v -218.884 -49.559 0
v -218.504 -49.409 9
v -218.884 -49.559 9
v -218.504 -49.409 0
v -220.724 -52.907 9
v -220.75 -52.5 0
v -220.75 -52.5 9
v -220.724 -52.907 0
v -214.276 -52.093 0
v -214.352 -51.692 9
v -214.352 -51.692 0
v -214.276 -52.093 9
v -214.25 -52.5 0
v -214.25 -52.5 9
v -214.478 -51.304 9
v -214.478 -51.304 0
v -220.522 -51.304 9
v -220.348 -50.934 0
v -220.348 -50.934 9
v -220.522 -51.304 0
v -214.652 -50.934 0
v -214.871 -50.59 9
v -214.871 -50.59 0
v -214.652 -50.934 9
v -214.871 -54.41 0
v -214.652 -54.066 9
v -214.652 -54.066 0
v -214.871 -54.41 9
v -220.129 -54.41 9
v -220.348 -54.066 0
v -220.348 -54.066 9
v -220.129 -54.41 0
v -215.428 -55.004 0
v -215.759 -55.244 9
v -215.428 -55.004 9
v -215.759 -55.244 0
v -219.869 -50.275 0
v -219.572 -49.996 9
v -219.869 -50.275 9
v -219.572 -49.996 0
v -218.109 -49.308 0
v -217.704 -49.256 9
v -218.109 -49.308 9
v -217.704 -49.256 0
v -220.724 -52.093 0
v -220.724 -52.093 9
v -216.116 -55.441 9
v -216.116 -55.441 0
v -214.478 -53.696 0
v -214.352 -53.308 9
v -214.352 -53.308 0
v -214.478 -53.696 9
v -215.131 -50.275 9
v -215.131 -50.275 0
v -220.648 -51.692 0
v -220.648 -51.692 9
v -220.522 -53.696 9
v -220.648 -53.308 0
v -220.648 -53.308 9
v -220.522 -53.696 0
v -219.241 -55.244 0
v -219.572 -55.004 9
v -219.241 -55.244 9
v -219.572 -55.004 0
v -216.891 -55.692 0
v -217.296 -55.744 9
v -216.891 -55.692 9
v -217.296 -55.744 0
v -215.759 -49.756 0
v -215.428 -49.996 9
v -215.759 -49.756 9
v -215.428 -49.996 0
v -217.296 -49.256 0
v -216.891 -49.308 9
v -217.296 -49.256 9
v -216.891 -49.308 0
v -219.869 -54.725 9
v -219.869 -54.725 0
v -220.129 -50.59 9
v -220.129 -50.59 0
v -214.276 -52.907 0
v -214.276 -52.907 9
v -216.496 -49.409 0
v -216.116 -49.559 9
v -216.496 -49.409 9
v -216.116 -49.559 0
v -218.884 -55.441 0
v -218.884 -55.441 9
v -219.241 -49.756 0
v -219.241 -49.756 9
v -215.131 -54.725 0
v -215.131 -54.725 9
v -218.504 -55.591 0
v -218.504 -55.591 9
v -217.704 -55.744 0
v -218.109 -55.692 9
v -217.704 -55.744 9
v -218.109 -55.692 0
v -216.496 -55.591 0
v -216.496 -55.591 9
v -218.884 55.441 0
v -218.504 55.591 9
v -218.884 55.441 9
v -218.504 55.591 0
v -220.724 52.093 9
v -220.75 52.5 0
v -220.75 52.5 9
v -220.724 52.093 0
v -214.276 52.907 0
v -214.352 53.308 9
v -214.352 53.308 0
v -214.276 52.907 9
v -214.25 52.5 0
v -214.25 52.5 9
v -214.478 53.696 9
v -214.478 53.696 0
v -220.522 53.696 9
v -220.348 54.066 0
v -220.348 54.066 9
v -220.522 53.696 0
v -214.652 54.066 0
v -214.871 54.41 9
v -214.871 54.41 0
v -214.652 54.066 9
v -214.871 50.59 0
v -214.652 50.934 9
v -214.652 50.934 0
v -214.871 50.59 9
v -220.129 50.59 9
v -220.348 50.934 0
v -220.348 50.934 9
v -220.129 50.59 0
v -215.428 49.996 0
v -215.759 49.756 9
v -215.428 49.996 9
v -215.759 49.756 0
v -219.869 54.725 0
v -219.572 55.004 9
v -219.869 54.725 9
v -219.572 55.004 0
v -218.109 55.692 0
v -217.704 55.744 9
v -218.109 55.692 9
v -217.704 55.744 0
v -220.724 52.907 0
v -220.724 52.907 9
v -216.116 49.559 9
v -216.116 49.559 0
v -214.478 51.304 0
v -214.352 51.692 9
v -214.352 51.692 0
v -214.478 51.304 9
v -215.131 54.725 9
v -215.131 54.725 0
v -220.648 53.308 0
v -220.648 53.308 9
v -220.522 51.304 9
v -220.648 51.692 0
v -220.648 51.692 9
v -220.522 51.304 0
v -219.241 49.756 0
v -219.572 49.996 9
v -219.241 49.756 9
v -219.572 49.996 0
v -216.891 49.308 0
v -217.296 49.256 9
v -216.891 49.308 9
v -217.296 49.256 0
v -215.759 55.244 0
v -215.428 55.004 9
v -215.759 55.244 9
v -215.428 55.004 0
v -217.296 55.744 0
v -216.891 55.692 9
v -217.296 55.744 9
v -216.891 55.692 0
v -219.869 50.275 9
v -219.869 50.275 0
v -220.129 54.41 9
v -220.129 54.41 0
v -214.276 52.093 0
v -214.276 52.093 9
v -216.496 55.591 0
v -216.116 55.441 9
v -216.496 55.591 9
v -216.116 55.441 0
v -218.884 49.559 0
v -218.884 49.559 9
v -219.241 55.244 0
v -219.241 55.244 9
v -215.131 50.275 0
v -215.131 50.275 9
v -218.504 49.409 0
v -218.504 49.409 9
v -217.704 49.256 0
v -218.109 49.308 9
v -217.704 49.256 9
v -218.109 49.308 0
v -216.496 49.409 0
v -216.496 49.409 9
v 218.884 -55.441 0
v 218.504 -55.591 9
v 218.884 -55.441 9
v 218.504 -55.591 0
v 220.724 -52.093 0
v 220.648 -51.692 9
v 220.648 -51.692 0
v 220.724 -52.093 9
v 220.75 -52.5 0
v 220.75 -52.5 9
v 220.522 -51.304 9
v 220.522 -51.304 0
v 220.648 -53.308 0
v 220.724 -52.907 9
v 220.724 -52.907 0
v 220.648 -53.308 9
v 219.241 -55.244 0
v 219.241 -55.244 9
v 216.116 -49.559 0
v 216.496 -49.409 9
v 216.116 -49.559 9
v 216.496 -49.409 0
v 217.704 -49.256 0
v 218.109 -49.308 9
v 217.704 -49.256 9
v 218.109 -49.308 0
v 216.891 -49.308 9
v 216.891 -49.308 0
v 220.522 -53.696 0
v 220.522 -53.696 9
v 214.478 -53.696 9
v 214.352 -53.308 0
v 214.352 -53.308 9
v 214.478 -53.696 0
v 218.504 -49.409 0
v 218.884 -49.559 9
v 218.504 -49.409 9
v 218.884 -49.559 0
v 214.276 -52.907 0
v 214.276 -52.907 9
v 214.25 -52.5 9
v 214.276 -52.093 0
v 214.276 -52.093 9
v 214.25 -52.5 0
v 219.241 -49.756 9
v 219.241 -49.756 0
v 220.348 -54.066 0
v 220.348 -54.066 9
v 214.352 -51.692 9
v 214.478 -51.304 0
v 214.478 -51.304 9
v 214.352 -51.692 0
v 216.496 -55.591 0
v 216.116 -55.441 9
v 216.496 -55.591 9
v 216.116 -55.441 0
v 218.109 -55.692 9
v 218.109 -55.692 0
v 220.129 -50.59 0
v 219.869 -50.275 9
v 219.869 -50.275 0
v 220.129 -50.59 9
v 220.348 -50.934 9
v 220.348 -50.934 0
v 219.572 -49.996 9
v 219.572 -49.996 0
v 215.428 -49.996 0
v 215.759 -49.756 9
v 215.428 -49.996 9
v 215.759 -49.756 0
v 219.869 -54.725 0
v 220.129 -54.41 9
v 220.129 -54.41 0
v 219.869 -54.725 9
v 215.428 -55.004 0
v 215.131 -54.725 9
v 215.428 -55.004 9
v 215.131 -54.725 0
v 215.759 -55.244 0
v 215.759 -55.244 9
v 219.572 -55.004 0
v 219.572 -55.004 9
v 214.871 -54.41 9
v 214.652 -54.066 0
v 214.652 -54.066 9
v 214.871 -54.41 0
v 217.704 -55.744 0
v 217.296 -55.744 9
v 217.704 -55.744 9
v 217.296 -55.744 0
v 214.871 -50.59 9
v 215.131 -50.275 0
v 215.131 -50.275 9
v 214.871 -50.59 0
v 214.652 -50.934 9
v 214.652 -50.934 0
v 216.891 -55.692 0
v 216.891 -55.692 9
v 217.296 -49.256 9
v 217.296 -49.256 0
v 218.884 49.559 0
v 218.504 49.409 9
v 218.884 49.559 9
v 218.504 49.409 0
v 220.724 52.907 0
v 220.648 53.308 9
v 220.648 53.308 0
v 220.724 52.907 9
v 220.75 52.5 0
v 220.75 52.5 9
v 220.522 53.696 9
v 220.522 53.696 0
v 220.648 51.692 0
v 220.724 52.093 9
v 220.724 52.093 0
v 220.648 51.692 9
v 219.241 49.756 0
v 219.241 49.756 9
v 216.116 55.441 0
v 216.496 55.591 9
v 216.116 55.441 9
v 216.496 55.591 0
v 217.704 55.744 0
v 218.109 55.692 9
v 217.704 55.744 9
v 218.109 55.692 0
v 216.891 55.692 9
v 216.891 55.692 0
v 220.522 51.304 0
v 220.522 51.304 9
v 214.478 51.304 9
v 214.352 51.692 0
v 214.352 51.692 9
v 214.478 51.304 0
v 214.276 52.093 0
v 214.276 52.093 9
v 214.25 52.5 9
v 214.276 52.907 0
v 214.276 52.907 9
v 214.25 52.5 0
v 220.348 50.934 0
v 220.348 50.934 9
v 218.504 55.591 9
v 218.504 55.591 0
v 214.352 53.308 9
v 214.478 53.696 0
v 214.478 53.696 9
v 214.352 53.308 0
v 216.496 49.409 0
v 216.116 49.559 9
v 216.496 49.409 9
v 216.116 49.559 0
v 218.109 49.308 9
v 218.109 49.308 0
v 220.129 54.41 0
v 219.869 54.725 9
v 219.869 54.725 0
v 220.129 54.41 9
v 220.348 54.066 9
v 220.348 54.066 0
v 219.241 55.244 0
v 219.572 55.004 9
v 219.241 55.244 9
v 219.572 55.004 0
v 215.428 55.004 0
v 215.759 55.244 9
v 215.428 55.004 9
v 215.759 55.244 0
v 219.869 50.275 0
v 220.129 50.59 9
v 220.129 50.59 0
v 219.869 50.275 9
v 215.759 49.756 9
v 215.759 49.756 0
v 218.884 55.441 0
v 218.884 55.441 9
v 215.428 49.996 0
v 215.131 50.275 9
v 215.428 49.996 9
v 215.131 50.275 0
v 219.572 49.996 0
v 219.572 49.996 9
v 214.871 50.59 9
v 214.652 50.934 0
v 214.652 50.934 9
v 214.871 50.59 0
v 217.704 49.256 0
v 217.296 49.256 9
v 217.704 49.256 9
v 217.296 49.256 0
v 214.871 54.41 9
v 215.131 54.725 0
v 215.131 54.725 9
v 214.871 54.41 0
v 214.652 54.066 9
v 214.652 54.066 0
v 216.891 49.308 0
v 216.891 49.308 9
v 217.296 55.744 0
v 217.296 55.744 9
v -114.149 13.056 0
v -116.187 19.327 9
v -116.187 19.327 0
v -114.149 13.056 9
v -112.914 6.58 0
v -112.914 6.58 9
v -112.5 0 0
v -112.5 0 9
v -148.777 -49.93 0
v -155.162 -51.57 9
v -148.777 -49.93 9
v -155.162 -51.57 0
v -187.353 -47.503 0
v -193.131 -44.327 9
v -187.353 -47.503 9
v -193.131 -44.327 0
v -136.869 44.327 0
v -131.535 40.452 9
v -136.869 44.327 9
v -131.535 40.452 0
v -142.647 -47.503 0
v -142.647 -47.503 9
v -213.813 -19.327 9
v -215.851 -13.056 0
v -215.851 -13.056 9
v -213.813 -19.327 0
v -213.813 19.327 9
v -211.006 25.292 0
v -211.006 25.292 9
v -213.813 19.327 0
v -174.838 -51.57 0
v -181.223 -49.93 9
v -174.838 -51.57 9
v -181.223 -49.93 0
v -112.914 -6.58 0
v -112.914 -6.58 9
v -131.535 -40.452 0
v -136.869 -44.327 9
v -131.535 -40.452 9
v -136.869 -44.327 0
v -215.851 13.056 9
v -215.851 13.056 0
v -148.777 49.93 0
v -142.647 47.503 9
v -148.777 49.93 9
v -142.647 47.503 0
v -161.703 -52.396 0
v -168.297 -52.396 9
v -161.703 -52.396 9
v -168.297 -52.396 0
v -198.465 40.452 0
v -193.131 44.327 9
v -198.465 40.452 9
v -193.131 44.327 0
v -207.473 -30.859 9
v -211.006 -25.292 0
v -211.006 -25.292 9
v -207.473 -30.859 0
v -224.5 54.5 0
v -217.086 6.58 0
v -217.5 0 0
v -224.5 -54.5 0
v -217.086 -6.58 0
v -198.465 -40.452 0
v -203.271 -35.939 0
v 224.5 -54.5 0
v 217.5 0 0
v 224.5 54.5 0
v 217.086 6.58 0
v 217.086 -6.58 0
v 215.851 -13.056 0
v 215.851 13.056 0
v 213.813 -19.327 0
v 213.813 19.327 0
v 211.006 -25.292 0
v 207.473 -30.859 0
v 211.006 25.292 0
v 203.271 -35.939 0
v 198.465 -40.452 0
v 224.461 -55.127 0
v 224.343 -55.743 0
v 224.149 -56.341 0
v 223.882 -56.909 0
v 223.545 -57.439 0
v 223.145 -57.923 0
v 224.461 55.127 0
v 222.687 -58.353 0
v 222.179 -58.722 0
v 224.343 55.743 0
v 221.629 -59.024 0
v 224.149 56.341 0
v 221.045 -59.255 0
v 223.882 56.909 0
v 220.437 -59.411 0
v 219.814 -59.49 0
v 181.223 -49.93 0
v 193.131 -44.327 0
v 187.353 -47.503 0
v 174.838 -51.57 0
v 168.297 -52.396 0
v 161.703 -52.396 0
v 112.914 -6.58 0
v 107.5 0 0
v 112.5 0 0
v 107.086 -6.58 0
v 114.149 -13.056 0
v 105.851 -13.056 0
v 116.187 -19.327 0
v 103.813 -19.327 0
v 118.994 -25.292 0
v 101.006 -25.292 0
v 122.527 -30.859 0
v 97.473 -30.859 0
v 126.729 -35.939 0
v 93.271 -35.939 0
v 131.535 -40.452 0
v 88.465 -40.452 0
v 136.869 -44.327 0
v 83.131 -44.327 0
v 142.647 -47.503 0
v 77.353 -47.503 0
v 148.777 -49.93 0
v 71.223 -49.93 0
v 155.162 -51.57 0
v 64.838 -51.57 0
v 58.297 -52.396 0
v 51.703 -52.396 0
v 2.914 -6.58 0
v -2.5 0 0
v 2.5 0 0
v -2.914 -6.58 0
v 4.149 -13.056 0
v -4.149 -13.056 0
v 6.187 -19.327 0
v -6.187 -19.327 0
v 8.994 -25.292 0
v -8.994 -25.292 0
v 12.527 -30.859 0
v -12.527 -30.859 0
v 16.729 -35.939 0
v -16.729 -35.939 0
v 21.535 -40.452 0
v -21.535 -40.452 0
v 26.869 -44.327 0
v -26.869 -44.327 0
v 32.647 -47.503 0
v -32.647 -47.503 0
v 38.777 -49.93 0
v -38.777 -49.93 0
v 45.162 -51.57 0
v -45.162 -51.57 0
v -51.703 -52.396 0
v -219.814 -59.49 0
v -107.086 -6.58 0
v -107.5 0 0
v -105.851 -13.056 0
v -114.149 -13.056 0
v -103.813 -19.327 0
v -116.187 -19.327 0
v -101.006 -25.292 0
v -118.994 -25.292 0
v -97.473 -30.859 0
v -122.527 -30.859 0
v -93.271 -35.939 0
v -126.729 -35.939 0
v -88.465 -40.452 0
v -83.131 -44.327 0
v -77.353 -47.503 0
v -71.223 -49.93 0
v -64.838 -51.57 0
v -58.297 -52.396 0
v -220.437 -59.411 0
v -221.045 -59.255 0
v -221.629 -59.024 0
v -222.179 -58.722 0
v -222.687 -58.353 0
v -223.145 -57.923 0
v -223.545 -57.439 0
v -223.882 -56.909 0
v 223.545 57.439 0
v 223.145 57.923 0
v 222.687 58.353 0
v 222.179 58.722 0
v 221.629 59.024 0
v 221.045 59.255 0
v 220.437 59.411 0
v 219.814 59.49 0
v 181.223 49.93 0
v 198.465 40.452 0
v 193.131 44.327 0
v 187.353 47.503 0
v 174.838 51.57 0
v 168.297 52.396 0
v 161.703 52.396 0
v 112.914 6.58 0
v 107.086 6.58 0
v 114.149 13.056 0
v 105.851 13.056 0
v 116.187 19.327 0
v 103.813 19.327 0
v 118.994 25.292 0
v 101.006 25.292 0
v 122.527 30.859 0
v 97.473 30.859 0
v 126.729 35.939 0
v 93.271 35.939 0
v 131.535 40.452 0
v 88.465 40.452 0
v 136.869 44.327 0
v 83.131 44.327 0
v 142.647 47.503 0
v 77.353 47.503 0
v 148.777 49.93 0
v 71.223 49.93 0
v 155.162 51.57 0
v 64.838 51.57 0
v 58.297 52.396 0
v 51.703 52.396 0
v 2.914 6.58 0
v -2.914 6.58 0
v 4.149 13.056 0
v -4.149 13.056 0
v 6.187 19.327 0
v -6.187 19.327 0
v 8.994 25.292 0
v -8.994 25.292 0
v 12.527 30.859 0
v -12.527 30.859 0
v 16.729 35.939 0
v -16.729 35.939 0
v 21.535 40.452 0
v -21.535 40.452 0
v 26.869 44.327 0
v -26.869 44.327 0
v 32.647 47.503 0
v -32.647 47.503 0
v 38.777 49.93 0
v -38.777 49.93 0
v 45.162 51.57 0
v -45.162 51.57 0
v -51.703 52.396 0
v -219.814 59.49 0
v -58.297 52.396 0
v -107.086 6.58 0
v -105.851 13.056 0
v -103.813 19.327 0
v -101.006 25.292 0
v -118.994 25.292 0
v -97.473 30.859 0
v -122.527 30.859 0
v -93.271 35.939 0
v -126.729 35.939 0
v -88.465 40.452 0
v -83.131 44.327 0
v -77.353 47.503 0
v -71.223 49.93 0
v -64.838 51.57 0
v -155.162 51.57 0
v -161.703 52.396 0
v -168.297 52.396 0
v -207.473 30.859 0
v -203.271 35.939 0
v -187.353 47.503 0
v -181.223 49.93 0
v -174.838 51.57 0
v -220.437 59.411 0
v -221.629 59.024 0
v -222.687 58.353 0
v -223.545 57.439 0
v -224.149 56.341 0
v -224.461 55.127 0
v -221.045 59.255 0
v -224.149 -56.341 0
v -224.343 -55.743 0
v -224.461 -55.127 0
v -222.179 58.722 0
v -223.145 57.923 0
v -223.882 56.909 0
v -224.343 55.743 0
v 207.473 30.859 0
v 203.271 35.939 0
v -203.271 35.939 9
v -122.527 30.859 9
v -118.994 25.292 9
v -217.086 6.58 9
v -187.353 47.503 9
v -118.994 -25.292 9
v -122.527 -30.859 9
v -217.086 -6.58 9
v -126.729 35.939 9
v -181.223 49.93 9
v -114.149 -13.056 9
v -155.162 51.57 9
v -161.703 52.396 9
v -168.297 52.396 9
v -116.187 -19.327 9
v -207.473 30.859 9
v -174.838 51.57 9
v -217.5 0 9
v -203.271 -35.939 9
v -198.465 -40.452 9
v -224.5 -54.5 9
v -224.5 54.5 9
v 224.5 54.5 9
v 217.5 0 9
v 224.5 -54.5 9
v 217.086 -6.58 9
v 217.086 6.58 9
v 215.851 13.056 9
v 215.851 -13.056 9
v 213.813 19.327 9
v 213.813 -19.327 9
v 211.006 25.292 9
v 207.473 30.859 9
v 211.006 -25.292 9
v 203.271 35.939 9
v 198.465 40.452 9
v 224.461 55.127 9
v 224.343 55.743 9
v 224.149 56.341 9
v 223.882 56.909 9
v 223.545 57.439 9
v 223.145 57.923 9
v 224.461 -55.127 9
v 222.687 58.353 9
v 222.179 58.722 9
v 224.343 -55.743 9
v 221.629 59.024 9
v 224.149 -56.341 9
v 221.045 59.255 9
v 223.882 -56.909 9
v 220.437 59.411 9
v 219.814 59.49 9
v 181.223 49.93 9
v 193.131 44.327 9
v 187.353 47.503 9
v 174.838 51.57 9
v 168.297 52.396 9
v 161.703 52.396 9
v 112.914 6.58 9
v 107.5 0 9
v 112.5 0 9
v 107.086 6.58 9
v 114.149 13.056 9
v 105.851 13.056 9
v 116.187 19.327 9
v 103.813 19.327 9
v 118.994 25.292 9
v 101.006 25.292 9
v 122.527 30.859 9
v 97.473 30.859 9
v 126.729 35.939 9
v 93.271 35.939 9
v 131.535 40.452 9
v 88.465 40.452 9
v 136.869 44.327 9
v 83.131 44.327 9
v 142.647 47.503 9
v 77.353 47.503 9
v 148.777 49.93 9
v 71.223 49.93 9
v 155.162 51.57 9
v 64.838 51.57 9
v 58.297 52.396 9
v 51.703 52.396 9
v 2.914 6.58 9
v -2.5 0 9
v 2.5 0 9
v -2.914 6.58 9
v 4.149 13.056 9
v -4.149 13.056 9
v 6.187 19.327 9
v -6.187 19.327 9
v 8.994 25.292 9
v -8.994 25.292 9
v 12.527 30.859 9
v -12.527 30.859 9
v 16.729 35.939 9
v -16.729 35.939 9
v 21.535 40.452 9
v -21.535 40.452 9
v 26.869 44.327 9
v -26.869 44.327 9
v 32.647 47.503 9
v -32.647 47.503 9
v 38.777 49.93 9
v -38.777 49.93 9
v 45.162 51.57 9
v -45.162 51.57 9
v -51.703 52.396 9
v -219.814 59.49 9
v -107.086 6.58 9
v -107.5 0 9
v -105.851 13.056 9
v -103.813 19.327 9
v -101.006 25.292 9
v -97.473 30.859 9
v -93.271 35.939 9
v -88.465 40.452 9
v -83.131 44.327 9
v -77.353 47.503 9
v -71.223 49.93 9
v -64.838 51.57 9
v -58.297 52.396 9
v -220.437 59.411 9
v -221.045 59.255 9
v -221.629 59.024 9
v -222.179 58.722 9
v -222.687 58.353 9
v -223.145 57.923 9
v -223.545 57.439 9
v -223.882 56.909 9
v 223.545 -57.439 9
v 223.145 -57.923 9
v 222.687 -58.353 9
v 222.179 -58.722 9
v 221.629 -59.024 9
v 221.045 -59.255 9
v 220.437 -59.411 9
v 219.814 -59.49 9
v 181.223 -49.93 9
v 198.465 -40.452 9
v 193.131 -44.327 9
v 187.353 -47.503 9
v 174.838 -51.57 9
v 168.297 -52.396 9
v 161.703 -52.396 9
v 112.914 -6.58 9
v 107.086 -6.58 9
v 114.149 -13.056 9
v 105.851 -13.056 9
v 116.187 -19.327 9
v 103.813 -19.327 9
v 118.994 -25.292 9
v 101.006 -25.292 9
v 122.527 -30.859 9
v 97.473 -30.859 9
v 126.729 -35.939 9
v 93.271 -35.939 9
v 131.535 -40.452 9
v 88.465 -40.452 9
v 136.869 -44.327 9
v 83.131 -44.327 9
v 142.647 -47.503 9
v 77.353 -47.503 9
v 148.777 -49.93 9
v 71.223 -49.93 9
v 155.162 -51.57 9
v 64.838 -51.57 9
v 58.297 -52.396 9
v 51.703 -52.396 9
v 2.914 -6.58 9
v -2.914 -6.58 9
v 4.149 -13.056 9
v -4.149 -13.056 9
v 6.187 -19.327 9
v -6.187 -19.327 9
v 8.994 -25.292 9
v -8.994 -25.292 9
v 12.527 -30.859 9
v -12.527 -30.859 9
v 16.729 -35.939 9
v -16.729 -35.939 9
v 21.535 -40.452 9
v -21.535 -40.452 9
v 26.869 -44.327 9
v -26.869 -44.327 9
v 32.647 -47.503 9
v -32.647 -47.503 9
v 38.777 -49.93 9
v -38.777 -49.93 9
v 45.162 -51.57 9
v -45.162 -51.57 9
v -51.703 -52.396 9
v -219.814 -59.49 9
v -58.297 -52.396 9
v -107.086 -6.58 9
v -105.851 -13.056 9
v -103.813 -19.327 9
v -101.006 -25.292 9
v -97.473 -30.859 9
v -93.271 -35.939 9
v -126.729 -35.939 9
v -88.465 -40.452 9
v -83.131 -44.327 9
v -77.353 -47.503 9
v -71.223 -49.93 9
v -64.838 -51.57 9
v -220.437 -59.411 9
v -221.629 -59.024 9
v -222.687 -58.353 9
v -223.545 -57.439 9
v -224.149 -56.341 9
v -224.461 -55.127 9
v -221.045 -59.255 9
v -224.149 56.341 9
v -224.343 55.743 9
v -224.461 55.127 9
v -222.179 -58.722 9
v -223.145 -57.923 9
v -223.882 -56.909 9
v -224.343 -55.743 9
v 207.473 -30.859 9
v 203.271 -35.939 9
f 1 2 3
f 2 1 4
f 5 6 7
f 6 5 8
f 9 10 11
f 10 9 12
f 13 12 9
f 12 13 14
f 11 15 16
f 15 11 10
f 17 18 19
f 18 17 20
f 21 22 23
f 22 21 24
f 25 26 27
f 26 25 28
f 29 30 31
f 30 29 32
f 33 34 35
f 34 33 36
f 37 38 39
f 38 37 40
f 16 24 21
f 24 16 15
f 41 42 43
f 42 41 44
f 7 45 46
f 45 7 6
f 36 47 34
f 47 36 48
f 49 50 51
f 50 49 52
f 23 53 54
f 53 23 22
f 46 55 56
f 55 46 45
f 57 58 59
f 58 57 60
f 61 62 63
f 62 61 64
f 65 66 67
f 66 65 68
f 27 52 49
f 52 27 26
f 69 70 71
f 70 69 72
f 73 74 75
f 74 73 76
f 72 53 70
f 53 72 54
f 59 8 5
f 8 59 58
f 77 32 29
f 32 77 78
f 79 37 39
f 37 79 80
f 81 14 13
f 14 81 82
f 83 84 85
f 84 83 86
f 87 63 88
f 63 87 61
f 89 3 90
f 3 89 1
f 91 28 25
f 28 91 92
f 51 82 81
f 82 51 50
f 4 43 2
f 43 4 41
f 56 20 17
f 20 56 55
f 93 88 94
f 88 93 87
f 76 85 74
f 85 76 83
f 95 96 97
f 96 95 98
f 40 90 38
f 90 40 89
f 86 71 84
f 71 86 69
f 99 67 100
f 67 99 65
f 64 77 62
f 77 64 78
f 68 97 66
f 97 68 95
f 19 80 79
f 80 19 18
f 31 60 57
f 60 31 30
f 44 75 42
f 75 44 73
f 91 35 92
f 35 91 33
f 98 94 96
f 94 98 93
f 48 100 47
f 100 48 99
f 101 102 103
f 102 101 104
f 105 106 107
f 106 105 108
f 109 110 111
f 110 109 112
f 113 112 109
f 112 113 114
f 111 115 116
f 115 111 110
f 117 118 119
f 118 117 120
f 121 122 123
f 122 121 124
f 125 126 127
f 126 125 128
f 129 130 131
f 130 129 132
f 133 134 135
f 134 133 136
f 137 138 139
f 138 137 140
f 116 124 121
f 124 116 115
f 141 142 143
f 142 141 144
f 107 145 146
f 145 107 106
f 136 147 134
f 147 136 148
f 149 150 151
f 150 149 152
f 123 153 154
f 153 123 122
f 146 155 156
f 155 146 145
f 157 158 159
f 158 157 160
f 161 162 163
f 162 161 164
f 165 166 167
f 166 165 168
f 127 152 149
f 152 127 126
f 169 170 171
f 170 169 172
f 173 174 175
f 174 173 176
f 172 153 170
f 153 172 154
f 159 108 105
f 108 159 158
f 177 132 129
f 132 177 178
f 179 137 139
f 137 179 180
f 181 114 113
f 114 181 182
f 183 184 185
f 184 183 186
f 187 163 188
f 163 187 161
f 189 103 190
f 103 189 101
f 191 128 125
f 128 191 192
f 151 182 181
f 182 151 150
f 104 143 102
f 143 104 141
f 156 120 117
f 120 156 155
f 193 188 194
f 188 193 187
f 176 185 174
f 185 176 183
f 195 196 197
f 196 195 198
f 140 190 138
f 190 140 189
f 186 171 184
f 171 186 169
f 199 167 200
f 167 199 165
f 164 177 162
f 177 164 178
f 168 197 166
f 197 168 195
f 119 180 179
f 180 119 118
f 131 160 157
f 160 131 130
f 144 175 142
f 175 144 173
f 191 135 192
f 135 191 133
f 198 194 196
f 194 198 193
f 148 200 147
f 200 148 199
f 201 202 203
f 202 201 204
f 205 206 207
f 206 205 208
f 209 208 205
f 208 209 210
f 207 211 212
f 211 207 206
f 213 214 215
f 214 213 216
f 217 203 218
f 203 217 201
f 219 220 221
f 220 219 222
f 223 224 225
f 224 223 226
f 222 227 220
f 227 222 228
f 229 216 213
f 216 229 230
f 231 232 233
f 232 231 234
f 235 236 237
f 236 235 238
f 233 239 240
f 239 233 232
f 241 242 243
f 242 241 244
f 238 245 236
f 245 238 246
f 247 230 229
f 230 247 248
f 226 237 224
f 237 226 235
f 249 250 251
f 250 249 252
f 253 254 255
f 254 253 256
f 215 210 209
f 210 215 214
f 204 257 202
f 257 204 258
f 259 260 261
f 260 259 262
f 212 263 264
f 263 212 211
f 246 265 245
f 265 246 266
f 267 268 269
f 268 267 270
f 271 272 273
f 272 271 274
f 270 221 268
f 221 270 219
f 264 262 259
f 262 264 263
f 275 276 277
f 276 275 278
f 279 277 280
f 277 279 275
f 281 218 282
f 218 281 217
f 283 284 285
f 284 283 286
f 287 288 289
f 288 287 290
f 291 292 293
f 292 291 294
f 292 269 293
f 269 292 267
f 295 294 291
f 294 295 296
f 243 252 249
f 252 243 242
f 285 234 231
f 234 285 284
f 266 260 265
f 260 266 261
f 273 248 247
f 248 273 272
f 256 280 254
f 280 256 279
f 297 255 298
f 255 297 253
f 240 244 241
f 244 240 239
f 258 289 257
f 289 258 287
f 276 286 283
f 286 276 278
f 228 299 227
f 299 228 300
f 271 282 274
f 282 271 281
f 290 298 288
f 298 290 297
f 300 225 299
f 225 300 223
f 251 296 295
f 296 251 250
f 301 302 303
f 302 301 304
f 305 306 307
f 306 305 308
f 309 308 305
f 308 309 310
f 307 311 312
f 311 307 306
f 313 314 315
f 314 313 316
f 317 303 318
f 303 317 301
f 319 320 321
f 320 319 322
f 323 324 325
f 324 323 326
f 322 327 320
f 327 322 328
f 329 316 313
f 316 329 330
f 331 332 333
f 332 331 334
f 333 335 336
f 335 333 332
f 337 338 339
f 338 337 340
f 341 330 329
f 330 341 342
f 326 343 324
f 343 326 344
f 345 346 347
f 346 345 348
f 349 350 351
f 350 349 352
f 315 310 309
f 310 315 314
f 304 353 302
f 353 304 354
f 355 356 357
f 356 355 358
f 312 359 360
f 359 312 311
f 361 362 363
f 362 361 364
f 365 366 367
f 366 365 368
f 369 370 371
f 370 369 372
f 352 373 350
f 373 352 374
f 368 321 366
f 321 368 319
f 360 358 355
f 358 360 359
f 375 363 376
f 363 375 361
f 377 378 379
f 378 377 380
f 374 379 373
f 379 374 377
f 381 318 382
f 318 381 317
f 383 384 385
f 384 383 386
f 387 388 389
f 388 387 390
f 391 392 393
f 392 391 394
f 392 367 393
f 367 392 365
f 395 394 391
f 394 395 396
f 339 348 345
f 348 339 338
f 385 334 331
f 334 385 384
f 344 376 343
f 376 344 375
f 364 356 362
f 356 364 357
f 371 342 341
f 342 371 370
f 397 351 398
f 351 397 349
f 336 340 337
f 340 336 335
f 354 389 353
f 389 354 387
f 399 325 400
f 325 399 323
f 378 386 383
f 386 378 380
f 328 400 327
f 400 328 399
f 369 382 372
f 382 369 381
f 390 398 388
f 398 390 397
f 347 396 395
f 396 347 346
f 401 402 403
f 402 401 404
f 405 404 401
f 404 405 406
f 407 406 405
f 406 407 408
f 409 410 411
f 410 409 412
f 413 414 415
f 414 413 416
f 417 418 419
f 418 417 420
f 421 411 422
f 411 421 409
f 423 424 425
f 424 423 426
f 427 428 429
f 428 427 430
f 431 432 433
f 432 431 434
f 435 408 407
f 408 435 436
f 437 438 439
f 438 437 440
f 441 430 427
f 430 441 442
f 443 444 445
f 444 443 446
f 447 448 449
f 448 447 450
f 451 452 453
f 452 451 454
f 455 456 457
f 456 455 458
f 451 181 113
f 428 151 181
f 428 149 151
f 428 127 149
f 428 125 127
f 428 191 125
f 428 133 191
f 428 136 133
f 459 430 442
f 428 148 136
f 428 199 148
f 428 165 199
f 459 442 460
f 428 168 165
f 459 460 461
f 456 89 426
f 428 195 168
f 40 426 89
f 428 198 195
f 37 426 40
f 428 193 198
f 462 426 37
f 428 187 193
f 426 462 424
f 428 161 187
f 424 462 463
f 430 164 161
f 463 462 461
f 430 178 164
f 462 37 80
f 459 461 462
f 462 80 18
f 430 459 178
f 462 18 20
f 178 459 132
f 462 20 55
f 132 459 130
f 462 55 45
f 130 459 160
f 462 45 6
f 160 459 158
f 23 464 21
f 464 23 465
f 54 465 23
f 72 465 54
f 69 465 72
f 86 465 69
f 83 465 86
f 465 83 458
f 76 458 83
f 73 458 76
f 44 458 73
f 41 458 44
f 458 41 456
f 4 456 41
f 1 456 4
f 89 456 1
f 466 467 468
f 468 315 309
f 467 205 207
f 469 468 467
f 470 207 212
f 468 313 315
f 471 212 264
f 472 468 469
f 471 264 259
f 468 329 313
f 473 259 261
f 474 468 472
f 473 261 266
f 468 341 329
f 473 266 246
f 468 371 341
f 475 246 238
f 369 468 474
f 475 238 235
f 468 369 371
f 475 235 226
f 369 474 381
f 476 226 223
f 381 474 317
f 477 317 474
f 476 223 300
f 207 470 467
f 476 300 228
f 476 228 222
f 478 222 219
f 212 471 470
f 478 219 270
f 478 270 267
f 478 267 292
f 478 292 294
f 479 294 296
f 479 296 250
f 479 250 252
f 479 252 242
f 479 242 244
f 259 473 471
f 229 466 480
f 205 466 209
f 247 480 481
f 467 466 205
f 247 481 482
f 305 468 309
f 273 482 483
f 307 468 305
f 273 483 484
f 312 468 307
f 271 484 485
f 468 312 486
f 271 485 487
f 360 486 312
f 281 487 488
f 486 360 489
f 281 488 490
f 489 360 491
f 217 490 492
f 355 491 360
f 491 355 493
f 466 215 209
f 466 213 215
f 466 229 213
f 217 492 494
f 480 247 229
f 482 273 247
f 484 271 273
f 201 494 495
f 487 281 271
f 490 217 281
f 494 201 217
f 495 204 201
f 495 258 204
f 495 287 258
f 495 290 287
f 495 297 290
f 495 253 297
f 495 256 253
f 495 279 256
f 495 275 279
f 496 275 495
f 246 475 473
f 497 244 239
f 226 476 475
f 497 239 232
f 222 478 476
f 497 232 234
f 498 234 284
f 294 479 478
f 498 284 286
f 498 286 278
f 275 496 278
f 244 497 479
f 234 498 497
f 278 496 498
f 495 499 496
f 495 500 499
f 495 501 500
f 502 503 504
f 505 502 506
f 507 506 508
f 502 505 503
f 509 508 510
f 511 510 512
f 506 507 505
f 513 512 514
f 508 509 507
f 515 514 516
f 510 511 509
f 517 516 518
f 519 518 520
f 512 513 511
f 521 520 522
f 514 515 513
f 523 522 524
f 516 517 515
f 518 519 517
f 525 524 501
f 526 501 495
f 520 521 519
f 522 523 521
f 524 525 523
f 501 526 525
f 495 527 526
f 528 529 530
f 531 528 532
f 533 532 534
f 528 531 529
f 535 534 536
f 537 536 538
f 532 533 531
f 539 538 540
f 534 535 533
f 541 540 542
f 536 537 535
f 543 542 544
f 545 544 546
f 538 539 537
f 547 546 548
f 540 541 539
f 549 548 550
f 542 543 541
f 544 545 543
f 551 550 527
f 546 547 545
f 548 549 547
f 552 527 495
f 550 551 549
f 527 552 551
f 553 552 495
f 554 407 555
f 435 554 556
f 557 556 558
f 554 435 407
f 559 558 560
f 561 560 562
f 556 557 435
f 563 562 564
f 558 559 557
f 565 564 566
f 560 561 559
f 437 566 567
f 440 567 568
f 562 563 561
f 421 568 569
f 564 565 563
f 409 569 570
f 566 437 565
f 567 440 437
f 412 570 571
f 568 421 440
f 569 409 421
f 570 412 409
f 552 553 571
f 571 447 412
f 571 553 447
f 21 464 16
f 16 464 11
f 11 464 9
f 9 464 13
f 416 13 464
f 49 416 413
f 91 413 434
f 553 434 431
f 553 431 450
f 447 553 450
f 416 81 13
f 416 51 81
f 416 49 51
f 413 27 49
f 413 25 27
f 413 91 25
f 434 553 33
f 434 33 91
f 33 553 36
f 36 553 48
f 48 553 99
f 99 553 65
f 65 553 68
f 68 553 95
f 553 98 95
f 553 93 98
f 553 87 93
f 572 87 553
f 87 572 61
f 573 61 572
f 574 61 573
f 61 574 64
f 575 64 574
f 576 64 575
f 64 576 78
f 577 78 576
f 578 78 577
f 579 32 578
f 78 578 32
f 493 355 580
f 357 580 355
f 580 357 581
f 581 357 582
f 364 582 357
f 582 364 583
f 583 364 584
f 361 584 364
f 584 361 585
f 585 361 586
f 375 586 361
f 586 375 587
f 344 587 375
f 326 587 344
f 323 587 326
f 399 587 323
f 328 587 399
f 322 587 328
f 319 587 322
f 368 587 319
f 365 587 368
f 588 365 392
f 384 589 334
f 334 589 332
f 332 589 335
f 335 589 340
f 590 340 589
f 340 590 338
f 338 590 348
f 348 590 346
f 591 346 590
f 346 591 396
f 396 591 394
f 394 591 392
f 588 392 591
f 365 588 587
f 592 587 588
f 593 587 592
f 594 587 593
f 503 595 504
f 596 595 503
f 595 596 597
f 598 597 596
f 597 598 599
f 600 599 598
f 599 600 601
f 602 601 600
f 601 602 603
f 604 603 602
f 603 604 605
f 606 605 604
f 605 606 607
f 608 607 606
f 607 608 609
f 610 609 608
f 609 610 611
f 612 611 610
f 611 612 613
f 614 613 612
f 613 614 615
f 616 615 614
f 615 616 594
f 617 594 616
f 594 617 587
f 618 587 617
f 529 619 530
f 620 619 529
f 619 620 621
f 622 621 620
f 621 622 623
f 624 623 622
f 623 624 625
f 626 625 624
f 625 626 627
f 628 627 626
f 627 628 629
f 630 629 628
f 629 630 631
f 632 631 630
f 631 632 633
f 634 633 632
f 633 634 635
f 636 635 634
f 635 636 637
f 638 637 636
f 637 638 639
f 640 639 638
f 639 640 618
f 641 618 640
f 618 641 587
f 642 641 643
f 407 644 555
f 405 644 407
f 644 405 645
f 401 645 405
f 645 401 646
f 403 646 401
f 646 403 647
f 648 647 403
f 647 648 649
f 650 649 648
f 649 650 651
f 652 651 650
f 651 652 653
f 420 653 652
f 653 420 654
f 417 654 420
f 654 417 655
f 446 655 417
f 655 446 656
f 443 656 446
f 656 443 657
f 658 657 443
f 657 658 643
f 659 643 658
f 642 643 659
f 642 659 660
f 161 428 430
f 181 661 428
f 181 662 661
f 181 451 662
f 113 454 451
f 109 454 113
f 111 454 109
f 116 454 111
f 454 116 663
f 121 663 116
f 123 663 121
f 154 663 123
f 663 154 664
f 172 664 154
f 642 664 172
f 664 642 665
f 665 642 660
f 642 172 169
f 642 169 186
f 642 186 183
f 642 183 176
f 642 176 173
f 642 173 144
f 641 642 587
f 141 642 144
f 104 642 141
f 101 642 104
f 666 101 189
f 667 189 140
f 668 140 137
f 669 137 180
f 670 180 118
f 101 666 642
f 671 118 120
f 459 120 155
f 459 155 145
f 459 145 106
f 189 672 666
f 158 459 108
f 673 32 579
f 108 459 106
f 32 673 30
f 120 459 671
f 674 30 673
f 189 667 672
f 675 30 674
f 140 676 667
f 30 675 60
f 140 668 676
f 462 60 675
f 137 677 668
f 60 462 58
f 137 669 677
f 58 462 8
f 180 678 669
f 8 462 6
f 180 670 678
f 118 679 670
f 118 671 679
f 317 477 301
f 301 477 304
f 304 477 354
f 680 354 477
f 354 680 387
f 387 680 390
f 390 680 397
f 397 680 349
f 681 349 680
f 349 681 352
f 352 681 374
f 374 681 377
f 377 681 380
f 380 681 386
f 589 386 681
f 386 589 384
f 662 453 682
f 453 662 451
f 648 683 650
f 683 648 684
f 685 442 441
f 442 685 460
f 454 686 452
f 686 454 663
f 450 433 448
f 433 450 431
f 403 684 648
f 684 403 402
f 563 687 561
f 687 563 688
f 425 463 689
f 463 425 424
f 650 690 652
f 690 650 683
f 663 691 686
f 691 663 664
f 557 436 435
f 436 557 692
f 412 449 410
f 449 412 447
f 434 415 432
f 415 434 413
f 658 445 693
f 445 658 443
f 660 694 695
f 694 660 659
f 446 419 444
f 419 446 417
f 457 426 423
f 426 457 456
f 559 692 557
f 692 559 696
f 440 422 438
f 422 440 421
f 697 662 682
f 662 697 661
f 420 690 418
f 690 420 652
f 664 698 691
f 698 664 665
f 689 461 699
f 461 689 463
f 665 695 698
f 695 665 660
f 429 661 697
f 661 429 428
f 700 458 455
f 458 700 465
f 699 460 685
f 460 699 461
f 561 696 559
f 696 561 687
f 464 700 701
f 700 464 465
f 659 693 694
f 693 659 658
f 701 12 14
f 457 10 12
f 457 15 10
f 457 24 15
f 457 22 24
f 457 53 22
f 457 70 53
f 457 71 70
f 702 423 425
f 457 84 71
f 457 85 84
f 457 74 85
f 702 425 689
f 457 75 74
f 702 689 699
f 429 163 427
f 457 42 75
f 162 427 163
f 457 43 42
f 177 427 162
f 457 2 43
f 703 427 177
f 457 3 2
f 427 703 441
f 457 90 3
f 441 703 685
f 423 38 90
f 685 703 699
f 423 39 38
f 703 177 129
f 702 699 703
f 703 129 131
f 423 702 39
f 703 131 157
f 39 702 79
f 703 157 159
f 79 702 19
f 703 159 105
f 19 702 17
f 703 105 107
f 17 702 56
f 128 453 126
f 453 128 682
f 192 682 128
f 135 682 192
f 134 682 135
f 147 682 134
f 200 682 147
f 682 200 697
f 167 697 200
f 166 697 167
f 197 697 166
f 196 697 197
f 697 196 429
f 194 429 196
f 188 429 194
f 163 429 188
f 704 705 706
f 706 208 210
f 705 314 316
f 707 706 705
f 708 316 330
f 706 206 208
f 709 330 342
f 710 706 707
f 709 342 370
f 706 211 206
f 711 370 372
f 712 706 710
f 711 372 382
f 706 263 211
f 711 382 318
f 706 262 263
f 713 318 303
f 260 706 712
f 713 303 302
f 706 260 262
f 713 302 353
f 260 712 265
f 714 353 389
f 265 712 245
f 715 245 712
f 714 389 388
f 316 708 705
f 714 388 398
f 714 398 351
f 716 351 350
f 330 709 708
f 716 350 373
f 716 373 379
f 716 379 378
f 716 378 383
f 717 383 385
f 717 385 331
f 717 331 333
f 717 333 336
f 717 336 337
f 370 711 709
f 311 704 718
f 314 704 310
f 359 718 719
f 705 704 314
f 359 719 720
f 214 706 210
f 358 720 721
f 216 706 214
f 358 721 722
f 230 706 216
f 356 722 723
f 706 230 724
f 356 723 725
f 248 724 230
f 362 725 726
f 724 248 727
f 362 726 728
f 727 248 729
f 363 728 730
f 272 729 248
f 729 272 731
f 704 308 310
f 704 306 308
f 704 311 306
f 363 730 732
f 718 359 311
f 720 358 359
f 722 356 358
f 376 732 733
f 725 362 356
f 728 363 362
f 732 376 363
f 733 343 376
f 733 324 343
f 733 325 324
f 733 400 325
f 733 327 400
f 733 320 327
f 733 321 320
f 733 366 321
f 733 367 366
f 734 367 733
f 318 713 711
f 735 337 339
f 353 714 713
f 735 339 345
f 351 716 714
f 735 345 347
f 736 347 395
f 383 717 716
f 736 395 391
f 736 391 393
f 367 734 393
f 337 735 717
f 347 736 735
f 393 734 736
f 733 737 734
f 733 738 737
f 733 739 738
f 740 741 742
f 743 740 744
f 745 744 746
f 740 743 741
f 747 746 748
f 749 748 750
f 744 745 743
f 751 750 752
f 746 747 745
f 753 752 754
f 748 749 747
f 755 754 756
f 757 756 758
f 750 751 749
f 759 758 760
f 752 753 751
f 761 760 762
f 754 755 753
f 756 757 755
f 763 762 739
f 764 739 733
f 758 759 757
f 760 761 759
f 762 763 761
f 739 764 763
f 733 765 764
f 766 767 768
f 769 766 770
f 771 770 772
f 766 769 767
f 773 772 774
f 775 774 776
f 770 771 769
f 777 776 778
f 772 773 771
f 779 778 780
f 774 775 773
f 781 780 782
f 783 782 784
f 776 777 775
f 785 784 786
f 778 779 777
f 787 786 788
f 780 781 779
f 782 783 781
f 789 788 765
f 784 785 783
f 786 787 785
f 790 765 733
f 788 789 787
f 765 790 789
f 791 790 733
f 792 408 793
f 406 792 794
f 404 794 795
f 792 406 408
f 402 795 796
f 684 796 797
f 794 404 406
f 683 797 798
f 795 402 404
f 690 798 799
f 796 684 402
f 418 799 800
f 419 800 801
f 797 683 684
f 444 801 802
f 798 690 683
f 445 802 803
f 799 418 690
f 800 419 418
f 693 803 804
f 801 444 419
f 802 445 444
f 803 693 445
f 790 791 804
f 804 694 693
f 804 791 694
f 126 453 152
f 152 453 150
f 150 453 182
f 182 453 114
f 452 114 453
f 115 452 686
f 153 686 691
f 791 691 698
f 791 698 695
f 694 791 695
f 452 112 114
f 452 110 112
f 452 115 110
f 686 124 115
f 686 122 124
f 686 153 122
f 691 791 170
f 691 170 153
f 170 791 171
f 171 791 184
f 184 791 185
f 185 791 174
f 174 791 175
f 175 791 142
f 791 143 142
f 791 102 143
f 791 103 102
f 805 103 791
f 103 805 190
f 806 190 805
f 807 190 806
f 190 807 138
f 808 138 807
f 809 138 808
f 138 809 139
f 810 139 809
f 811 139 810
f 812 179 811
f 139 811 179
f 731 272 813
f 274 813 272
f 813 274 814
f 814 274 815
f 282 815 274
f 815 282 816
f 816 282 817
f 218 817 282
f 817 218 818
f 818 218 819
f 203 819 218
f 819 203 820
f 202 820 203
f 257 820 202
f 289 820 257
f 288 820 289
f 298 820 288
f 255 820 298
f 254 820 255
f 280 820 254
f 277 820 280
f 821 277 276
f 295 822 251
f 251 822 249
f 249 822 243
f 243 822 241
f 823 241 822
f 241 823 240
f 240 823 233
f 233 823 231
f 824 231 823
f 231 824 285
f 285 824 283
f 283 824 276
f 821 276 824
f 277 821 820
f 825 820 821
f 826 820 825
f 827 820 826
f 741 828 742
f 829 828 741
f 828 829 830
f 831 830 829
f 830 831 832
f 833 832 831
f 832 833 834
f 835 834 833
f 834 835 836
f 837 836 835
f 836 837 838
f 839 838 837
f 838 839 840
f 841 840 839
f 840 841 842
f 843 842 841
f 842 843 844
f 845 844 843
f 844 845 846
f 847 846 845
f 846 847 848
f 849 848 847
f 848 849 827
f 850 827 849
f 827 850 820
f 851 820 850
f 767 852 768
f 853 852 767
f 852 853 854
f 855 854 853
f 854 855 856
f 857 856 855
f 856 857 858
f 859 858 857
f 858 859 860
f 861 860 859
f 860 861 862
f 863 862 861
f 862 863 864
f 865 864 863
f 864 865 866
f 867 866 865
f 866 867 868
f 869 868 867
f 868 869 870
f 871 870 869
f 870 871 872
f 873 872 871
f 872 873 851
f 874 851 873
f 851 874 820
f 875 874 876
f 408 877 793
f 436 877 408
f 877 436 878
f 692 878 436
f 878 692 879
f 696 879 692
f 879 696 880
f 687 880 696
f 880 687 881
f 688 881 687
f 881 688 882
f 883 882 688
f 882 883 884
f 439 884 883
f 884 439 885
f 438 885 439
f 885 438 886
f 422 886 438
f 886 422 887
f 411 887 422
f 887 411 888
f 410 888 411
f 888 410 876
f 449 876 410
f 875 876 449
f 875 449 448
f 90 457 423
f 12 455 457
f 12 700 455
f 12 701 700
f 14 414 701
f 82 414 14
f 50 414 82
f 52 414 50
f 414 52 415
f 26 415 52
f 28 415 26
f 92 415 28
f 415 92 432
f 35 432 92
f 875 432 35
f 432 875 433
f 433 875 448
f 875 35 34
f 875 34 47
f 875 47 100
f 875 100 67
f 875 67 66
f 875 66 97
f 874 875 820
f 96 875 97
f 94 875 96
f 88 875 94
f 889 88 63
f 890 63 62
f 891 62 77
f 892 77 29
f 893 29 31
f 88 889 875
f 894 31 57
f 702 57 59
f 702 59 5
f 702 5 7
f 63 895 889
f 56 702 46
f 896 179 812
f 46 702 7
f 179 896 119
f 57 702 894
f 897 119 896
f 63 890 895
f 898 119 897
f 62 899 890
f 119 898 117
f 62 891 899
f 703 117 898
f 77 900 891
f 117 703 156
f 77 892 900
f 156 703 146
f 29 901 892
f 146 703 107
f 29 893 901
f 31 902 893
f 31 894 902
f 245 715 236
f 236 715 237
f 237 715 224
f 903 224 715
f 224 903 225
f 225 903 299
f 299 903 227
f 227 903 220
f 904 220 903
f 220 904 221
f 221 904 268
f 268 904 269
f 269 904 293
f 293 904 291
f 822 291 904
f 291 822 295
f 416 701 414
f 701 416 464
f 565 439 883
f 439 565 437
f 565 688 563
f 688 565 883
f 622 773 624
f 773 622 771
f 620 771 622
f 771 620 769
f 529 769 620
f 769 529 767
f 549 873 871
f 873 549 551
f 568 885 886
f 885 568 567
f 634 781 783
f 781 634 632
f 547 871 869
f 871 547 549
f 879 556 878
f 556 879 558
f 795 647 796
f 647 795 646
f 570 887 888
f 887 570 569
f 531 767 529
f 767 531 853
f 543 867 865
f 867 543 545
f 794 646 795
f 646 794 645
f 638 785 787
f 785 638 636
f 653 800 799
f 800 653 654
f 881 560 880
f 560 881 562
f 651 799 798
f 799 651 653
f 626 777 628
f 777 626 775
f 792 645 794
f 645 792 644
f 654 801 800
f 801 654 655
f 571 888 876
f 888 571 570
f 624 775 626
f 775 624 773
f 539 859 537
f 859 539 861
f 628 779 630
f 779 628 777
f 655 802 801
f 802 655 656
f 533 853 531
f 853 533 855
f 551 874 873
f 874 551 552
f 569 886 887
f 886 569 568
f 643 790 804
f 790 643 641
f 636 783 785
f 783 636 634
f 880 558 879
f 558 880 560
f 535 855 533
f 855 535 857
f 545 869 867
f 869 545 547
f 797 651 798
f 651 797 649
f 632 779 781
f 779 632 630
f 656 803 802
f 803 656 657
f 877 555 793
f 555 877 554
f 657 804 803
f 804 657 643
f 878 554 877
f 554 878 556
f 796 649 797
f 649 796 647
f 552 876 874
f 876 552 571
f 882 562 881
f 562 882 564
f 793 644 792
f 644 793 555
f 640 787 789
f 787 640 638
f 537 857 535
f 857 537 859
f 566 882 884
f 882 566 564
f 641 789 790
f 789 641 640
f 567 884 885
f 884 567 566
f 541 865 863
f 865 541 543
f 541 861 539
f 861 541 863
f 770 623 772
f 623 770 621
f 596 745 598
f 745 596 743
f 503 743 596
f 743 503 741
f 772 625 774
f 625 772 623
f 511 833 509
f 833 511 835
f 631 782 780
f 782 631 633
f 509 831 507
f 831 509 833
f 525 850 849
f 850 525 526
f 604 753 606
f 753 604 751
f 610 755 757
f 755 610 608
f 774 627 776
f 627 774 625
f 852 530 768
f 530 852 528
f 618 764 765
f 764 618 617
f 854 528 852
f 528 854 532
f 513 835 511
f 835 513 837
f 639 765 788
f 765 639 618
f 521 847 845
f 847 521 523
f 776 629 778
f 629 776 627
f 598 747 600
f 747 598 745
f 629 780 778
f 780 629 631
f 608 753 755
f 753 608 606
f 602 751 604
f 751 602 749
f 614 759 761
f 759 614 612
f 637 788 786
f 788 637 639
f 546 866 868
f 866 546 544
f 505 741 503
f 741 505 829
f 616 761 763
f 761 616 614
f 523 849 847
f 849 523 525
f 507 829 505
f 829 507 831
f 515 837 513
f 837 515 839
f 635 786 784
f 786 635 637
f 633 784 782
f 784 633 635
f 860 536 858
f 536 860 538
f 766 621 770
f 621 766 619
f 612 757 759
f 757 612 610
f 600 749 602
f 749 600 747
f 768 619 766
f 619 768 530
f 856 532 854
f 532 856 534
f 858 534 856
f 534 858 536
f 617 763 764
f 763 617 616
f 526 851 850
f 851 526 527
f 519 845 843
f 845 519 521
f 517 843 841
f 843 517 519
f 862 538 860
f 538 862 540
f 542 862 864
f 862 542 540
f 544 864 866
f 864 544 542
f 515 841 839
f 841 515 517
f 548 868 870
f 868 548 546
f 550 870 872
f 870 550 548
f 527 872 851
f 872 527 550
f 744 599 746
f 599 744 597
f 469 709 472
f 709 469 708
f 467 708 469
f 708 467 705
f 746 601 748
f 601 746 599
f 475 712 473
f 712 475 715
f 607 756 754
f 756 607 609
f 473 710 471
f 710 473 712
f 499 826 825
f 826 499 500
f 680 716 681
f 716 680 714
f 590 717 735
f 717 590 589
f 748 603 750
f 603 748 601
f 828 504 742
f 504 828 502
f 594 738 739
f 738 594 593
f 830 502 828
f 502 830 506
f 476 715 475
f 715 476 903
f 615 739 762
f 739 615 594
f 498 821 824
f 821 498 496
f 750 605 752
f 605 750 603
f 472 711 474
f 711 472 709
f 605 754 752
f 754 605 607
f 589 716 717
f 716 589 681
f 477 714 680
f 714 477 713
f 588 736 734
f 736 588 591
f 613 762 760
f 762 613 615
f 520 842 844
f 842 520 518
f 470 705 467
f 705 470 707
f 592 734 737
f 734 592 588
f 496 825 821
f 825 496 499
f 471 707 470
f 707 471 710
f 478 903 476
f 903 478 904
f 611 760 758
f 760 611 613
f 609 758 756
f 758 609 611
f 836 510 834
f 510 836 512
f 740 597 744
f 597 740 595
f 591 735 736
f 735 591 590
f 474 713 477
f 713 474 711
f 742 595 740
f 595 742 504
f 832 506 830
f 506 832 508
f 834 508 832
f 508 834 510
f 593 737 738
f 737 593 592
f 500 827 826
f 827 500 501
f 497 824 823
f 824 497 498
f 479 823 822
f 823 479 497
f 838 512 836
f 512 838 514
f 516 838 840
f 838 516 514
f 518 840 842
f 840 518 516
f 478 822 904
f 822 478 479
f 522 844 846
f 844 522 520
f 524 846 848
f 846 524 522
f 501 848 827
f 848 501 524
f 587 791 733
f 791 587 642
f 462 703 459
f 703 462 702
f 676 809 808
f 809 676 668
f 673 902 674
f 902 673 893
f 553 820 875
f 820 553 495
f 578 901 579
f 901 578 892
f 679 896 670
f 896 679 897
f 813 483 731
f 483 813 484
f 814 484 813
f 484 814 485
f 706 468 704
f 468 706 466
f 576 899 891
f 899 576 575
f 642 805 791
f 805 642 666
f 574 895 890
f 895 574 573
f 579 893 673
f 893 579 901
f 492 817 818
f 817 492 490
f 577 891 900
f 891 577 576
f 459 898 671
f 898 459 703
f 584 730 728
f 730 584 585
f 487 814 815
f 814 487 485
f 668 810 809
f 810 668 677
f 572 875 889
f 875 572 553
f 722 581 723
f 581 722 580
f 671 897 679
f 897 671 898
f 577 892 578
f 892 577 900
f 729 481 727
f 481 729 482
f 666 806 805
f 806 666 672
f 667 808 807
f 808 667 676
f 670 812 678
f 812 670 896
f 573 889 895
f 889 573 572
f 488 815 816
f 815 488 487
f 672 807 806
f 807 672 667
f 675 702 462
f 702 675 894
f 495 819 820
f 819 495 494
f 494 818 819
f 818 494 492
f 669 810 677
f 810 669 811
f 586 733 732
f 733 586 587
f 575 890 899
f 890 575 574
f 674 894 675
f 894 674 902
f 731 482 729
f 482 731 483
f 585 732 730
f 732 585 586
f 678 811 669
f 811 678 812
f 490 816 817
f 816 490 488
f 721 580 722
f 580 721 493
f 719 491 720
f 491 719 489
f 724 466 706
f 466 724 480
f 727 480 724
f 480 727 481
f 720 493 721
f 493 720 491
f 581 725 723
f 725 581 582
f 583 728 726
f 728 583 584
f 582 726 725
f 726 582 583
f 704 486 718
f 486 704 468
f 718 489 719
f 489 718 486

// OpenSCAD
$fn = 50;


difference() {
	union() {
		hull() {
			translate(v = [-219.5000000000, 54.5000000000, 0]) {
				cylinder(h = 9, r = 5);
			}
			translate(v = [219.5000000000, 54.5000000000, 0]) {
				cylinder(h = 9, r = 5);
			}
			translate(v = [-219.5000000000, -54.5000000000, 0]) {
				cylinder(h = 9, r = 5);
			}
			translate(v = [219.5000000000, -54.5000000000, 0]) {
				cylinder(h = 9, r = 5);
			}
		}
	}
	union() {
		#translate(v = [-217.5000000000, -52.5000000000, -100.0000000000]) {
			cylinder(h = 200, r = 3.2500000000);
		}
		#translate(v = [-217.5000000000, 52.5000000000, -100.0000000000]) {
			cylinder(h = 200, r = 3.2500000000);
		}
		#translate(v = [217.5000000000, -52.5000000000, -100.0000000000]) {
			cylinder(h = 200, r = 3.2500000000);
		}
		#translate(v = [217.5000000000, 52.5000000000, -100.0000000000]) {
			cylinder(h = 200, r = 3.2500000000);
		}
		#translate(v = [-165.0000000000, 0, 0]) {
			cylinder(h = 9, r = 52.5000000000);
		}
		#translate(v = [-55.0000000000, 0, 0]) {
			cylinder(h = 9, r = 52.5000000000);
		}
		#translate(v = [55.0000000000, 0, 0]) {
			cylinder(h = 9, r = 52.5000000000);
		}
		#translate(v = [165.0000000000, 0, 0]) {
			cylinder(h = 9, r = 52.5000000000);
		}
	}
}
